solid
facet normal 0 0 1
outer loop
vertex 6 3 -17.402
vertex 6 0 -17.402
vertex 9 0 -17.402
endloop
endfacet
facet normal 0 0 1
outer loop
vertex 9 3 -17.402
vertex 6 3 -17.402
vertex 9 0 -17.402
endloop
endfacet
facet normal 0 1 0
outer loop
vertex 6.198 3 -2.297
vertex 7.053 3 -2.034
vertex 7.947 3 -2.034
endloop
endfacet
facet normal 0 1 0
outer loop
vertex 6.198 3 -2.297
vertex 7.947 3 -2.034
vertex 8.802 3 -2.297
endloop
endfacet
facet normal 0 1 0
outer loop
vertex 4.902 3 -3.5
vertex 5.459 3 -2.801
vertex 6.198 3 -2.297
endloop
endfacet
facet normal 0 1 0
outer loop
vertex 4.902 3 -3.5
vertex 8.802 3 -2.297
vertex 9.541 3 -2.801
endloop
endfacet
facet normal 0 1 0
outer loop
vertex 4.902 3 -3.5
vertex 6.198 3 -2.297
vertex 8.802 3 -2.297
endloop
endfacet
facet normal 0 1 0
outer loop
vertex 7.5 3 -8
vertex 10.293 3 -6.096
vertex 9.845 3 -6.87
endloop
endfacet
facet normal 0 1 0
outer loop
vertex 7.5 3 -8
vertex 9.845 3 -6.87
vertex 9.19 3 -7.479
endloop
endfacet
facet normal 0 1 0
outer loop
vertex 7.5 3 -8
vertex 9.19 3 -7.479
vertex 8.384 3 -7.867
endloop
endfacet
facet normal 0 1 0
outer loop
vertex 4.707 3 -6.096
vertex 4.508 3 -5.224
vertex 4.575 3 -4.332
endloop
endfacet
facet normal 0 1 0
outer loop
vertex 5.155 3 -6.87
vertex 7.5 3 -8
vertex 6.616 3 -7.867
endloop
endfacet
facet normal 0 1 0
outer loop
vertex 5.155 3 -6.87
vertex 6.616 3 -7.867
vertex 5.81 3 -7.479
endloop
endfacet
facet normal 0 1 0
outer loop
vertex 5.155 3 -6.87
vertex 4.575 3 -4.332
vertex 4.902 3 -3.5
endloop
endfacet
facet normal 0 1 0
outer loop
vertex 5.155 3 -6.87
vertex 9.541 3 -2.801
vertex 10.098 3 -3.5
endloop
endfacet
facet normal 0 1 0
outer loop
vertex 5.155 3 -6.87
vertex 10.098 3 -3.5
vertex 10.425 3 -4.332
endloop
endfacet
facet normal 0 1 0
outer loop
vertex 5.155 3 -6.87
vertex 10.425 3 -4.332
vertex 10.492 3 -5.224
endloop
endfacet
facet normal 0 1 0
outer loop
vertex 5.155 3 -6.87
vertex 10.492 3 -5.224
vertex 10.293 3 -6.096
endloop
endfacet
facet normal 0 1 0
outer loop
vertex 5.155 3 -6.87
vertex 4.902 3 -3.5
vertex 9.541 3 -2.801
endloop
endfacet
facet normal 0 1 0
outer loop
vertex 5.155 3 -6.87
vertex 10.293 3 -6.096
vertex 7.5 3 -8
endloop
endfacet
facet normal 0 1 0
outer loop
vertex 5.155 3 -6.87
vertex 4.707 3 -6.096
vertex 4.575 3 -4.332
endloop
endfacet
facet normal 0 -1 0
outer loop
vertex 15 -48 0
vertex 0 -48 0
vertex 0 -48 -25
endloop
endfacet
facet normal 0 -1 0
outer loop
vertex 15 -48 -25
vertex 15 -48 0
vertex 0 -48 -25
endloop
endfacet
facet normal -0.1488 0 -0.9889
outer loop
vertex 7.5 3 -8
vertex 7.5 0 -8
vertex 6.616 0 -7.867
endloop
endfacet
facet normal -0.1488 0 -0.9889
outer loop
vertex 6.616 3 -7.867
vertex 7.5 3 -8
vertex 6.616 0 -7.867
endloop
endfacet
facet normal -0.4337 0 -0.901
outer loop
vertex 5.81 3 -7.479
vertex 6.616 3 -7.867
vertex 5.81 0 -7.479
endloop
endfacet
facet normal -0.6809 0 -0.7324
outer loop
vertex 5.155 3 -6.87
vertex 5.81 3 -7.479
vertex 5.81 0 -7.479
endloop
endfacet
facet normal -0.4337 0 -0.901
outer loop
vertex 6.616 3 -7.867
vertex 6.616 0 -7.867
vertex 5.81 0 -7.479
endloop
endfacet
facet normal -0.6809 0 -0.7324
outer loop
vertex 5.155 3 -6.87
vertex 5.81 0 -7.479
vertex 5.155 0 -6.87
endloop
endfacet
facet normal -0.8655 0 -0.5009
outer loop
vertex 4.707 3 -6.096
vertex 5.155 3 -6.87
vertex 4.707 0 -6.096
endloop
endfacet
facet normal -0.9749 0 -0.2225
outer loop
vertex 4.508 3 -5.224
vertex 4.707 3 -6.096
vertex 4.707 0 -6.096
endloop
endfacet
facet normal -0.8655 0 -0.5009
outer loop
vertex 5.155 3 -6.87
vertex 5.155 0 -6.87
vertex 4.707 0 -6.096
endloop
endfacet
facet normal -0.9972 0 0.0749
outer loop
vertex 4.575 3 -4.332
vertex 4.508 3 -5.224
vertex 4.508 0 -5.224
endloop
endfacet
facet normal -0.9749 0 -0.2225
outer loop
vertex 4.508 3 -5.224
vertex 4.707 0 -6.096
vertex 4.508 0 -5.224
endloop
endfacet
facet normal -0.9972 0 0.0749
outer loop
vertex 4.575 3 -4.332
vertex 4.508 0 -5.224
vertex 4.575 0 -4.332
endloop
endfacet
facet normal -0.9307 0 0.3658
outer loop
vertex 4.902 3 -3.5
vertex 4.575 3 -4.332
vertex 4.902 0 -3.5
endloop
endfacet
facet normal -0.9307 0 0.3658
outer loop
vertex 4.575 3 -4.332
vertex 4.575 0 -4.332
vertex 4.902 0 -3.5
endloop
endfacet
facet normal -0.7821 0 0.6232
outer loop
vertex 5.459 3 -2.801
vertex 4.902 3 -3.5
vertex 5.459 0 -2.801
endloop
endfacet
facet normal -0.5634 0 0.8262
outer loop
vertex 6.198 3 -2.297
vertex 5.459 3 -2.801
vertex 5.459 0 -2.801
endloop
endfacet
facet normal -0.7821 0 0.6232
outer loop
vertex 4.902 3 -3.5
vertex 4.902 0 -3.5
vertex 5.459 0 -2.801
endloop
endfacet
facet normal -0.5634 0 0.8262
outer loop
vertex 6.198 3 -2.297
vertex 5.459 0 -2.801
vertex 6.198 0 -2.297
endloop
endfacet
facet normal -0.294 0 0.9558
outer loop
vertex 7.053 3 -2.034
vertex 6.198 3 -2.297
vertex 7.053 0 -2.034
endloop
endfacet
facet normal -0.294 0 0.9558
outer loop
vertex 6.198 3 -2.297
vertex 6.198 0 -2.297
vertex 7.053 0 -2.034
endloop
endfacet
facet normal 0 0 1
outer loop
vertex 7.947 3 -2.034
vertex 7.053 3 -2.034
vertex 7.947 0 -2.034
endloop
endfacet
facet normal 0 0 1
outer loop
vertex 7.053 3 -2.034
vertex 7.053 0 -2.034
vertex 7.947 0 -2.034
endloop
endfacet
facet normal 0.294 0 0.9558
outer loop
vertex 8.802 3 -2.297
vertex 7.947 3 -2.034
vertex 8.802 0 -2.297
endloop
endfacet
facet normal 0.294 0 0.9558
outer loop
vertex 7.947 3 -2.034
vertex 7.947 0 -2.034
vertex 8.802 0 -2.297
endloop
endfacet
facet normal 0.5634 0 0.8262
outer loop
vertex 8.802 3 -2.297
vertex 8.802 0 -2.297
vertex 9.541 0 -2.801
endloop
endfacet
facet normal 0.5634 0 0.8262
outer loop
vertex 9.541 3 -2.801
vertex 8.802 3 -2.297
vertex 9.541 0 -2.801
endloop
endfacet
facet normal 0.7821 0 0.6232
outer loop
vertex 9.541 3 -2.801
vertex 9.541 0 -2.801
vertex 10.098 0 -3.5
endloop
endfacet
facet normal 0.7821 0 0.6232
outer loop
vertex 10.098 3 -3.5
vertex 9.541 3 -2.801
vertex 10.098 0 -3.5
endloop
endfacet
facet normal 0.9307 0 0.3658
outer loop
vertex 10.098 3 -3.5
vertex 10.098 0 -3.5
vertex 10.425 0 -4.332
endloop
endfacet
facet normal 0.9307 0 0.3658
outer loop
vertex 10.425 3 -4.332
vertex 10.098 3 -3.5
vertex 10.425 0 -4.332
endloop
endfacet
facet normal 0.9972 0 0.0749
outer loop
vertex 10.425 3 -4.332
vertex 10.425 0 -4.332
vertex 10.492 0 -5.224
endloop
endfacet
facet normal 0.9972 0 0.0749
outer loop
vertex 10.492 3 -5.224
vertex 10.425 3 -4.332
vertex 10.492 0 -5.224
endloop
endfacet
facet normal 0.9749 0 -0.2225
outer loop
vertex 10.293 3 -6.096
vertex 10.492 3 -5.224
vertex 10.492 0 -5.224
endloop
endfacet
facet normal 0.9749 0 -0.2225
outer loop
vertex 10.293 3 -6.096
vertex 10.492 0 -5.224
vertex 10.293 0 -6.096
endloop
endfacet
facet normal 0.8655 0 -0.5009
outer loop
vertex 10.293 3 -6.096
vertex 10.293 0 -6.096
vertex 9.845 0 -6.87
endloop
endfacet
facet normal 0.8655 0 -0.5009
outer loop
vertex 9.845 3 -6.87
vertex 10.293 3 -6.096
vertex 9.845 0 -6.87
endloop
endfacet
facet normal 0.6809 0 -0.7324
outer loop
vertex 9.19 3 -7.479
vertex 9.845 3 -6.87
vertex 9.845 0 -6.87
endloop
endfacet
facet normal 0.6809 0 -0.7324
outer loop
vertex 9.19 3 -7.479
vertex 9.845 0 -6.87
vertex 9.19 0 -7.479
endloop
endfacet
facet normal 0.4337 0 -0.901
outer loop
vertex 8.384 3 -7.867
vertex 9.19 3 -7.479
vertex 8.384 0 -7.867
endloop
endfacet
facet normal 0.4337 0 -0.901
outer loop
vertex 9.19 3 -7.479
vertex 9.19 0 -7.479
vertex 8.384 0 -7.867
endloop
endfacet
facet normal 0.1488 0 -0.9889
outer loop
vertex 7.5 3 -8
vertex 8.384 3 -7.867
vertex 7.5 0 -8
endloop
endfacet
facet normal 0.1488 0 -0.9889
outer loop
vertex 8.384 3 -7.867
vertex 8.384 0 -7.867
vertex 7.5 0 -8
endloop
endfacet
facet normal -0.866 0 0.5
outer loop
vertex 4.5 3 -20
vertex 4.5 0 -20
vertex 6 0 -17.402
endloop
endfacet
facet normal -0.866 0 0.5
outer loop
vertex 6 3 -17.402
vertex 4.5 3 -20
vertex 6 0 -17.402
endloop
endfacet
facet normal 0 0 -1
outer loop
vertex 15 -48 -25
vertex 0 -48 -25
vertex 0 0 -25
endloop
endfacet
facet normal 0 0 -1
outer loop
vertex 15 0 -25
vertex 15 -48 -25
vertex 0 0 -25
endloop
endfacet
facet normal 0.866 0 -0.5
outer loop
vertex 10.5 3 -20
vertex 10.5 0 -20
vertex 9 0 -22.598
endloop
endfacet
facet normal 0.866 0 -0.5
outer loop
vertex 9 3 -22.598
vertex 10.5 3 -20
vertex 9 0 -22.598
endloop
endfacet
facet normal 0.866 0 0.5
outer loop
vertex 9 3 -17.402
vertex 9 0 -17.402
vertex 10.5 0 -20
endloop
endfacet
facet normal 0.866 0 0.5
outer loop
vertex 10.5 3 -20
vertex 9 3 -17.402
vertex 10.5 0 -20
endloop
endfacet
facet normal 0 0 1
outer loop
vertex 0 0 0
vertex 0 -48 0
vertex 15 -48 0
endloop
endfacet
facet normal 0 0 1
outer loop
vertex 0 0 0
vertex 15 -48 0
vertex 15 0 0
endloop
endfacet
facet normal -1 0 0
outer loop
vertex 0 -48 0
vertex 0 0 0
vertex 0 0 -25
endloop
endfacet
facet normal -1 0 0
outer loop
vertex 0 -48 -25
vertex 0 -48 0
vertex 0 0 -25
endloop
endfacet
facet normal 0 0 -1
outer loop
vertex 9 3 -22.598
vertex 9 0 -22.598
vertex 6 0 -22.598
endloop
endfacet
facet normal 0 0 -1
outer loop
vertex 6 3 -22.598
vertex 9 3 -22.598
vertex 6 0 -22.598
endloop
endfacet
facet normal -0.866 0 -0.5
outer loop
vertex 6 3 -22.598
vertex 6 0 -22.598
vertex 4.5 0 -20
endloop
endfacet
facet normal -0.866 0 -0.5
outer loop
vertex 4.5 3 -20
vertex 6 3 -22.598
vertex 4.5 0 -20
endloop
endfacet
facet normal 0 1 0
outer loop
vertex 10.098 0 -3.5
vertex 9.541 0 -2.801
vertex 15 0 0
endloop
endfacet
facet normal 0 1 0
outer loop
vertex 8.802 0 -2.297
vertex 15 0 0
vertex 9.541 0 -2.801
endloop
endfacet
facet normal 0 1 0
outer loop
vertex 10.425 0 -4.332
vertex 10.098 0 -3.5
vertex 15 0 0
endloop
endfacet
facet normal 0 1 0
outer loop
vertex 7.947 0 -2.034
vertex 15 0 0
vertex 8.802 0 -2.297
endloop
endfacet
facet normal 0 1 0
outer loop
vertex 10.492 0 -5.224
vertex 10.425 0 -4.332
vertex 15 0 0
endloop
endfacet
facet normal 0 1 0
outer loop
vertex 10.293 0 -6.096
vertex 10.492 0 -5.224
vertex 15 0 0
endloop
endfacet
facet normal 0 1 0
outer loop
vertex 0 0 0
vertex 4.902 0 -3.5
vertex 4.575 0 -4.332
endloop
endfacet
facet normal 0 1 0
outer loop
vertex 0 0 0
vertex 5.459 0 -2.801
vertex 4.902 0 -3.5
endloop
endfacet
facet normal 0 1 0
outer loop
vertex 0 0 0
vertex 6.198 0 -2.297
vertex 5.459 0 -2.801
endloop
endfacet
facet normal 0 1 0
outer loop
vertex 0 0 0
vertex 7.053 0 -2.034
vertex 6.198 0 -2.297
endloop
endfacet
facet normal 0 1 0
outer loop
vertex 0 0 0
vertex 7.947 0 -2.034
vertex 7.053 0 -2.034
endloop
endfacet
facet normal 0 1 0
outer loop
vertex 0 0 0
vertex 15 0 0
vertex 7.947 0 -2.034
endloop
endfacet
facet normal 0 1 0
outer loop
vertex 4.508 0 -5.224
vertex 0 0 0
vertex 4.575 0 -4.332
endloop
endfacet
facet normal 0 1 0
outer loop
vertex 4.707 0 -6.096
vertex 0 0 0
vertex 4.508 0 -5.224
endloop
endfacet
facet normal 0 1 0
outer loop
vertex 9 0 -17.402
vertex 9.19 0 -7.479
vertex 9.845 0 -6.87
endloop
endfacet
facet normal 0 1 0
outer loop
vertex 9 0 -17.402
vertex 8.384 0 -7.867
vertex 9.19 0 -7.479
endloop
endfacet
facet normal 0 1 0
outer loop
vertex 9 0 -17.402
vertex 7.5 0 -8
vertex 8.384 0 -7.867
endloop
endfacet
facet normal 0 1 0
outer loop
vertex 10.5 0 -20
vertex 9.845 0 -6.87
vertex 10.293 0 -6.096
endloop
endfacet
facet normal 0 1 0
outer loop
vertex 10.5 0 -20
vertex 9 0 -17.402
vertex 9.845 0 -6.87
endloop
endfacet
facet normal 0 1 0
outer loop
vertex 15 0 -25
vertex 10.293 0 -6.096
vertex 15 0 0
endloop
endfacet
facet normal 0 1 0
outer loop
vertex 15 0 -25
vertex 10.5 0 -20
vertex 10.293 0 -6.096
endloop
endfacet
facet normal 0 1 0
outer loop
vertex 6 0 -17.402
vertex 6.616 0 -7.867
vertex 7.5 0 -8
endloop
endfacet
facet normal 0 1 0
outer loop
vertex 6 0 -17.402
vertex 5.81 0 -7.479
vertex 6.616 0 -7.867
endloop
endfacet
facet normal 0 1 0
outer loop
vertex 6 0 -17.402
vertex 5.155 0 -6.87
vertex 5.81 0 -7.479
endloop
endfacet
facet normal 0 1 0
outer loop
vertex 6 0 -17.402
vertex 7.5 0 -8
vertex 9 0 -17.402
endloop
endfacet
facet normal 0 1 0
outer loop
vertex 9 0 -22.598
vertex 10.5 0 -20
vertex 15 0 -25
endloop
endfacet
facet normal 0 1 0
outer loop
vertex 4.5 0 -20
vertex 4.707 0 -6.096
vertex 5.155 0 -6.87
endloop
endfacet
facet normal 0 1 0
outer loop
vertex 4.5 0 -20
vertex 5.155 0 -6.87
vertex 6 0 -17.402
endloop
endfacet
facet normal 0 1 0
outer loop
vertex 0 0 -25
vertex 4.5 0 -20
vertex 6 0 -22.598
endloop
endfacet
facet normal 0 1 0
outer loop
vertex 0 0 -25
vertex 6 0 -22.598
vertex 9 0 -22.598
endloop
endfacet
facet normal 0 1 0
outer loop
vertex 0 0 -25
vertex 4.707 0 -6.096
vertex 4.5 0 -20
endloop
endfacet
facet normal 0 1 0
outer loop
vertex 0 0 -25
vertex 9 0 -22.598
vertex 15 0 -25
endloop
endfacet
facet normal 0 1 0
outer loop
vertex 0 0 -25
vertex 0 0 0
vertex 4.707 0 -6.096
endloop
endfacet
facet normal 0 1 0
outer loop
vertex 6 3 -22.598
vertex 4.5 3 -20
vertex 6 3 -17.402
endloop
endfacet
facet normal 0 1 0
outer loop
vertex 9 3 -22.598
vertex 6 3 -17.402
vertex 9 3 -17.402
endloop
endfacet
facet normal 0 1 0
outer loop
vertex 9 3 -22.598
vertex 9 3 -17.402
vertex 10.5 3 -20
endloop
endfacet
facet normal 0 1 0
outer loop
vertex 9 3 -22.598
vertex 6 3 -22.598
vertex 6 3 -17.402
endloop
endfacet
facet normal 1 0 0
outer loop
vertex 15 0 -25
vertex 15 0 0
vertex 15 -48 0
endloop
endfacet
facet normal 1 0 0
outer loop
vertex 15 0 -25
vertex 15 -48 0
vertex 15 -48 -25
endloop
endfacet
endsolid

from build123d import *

# Parameters (mm, degrees)
SKETCH1_W           = 25
SKETCH1_H           = 48
BOSS_EXTRUDE1_DEPTH = 15
SKETCH2_R           = 3
BOSS_EXTRUDE2_DEPTH = 3


with BuildPart() as part:
    # Sketch1 → Boss-Extrude1 (new body)
    with BuildSketch(Plane(origin=(0, 0, 0), x_dir=(0, 0, -1), z_dir=(1, 0, 0))):
        with Locations((12.5, -24)):
            Rectangle(SKETCH1_W, SKETCH1_H)
    extrude(amount=BOSS_EXTRUDE1_DEPTH)

    # Sketch2 → Boss-Extrude2 (add)
    with BuildSketch(Plane(origin=(0, 0, 0), x_dir=(1, 0, 0), z_dir=(0, 1, 0))):
        with Locations(Location((7.5, 5, 0), (0, 0, 90))):
            Circle(SKETCH2_R)
        Polygon((4.5, 20), (6, 17.401923789), (9, 17.401923789), (10.5, 20), (9, 22.598076211), (6, 22.598076211), align=None)
    extrude(amount=BOSS_EXTRUDE2_DEPTH)


solid = part.part
